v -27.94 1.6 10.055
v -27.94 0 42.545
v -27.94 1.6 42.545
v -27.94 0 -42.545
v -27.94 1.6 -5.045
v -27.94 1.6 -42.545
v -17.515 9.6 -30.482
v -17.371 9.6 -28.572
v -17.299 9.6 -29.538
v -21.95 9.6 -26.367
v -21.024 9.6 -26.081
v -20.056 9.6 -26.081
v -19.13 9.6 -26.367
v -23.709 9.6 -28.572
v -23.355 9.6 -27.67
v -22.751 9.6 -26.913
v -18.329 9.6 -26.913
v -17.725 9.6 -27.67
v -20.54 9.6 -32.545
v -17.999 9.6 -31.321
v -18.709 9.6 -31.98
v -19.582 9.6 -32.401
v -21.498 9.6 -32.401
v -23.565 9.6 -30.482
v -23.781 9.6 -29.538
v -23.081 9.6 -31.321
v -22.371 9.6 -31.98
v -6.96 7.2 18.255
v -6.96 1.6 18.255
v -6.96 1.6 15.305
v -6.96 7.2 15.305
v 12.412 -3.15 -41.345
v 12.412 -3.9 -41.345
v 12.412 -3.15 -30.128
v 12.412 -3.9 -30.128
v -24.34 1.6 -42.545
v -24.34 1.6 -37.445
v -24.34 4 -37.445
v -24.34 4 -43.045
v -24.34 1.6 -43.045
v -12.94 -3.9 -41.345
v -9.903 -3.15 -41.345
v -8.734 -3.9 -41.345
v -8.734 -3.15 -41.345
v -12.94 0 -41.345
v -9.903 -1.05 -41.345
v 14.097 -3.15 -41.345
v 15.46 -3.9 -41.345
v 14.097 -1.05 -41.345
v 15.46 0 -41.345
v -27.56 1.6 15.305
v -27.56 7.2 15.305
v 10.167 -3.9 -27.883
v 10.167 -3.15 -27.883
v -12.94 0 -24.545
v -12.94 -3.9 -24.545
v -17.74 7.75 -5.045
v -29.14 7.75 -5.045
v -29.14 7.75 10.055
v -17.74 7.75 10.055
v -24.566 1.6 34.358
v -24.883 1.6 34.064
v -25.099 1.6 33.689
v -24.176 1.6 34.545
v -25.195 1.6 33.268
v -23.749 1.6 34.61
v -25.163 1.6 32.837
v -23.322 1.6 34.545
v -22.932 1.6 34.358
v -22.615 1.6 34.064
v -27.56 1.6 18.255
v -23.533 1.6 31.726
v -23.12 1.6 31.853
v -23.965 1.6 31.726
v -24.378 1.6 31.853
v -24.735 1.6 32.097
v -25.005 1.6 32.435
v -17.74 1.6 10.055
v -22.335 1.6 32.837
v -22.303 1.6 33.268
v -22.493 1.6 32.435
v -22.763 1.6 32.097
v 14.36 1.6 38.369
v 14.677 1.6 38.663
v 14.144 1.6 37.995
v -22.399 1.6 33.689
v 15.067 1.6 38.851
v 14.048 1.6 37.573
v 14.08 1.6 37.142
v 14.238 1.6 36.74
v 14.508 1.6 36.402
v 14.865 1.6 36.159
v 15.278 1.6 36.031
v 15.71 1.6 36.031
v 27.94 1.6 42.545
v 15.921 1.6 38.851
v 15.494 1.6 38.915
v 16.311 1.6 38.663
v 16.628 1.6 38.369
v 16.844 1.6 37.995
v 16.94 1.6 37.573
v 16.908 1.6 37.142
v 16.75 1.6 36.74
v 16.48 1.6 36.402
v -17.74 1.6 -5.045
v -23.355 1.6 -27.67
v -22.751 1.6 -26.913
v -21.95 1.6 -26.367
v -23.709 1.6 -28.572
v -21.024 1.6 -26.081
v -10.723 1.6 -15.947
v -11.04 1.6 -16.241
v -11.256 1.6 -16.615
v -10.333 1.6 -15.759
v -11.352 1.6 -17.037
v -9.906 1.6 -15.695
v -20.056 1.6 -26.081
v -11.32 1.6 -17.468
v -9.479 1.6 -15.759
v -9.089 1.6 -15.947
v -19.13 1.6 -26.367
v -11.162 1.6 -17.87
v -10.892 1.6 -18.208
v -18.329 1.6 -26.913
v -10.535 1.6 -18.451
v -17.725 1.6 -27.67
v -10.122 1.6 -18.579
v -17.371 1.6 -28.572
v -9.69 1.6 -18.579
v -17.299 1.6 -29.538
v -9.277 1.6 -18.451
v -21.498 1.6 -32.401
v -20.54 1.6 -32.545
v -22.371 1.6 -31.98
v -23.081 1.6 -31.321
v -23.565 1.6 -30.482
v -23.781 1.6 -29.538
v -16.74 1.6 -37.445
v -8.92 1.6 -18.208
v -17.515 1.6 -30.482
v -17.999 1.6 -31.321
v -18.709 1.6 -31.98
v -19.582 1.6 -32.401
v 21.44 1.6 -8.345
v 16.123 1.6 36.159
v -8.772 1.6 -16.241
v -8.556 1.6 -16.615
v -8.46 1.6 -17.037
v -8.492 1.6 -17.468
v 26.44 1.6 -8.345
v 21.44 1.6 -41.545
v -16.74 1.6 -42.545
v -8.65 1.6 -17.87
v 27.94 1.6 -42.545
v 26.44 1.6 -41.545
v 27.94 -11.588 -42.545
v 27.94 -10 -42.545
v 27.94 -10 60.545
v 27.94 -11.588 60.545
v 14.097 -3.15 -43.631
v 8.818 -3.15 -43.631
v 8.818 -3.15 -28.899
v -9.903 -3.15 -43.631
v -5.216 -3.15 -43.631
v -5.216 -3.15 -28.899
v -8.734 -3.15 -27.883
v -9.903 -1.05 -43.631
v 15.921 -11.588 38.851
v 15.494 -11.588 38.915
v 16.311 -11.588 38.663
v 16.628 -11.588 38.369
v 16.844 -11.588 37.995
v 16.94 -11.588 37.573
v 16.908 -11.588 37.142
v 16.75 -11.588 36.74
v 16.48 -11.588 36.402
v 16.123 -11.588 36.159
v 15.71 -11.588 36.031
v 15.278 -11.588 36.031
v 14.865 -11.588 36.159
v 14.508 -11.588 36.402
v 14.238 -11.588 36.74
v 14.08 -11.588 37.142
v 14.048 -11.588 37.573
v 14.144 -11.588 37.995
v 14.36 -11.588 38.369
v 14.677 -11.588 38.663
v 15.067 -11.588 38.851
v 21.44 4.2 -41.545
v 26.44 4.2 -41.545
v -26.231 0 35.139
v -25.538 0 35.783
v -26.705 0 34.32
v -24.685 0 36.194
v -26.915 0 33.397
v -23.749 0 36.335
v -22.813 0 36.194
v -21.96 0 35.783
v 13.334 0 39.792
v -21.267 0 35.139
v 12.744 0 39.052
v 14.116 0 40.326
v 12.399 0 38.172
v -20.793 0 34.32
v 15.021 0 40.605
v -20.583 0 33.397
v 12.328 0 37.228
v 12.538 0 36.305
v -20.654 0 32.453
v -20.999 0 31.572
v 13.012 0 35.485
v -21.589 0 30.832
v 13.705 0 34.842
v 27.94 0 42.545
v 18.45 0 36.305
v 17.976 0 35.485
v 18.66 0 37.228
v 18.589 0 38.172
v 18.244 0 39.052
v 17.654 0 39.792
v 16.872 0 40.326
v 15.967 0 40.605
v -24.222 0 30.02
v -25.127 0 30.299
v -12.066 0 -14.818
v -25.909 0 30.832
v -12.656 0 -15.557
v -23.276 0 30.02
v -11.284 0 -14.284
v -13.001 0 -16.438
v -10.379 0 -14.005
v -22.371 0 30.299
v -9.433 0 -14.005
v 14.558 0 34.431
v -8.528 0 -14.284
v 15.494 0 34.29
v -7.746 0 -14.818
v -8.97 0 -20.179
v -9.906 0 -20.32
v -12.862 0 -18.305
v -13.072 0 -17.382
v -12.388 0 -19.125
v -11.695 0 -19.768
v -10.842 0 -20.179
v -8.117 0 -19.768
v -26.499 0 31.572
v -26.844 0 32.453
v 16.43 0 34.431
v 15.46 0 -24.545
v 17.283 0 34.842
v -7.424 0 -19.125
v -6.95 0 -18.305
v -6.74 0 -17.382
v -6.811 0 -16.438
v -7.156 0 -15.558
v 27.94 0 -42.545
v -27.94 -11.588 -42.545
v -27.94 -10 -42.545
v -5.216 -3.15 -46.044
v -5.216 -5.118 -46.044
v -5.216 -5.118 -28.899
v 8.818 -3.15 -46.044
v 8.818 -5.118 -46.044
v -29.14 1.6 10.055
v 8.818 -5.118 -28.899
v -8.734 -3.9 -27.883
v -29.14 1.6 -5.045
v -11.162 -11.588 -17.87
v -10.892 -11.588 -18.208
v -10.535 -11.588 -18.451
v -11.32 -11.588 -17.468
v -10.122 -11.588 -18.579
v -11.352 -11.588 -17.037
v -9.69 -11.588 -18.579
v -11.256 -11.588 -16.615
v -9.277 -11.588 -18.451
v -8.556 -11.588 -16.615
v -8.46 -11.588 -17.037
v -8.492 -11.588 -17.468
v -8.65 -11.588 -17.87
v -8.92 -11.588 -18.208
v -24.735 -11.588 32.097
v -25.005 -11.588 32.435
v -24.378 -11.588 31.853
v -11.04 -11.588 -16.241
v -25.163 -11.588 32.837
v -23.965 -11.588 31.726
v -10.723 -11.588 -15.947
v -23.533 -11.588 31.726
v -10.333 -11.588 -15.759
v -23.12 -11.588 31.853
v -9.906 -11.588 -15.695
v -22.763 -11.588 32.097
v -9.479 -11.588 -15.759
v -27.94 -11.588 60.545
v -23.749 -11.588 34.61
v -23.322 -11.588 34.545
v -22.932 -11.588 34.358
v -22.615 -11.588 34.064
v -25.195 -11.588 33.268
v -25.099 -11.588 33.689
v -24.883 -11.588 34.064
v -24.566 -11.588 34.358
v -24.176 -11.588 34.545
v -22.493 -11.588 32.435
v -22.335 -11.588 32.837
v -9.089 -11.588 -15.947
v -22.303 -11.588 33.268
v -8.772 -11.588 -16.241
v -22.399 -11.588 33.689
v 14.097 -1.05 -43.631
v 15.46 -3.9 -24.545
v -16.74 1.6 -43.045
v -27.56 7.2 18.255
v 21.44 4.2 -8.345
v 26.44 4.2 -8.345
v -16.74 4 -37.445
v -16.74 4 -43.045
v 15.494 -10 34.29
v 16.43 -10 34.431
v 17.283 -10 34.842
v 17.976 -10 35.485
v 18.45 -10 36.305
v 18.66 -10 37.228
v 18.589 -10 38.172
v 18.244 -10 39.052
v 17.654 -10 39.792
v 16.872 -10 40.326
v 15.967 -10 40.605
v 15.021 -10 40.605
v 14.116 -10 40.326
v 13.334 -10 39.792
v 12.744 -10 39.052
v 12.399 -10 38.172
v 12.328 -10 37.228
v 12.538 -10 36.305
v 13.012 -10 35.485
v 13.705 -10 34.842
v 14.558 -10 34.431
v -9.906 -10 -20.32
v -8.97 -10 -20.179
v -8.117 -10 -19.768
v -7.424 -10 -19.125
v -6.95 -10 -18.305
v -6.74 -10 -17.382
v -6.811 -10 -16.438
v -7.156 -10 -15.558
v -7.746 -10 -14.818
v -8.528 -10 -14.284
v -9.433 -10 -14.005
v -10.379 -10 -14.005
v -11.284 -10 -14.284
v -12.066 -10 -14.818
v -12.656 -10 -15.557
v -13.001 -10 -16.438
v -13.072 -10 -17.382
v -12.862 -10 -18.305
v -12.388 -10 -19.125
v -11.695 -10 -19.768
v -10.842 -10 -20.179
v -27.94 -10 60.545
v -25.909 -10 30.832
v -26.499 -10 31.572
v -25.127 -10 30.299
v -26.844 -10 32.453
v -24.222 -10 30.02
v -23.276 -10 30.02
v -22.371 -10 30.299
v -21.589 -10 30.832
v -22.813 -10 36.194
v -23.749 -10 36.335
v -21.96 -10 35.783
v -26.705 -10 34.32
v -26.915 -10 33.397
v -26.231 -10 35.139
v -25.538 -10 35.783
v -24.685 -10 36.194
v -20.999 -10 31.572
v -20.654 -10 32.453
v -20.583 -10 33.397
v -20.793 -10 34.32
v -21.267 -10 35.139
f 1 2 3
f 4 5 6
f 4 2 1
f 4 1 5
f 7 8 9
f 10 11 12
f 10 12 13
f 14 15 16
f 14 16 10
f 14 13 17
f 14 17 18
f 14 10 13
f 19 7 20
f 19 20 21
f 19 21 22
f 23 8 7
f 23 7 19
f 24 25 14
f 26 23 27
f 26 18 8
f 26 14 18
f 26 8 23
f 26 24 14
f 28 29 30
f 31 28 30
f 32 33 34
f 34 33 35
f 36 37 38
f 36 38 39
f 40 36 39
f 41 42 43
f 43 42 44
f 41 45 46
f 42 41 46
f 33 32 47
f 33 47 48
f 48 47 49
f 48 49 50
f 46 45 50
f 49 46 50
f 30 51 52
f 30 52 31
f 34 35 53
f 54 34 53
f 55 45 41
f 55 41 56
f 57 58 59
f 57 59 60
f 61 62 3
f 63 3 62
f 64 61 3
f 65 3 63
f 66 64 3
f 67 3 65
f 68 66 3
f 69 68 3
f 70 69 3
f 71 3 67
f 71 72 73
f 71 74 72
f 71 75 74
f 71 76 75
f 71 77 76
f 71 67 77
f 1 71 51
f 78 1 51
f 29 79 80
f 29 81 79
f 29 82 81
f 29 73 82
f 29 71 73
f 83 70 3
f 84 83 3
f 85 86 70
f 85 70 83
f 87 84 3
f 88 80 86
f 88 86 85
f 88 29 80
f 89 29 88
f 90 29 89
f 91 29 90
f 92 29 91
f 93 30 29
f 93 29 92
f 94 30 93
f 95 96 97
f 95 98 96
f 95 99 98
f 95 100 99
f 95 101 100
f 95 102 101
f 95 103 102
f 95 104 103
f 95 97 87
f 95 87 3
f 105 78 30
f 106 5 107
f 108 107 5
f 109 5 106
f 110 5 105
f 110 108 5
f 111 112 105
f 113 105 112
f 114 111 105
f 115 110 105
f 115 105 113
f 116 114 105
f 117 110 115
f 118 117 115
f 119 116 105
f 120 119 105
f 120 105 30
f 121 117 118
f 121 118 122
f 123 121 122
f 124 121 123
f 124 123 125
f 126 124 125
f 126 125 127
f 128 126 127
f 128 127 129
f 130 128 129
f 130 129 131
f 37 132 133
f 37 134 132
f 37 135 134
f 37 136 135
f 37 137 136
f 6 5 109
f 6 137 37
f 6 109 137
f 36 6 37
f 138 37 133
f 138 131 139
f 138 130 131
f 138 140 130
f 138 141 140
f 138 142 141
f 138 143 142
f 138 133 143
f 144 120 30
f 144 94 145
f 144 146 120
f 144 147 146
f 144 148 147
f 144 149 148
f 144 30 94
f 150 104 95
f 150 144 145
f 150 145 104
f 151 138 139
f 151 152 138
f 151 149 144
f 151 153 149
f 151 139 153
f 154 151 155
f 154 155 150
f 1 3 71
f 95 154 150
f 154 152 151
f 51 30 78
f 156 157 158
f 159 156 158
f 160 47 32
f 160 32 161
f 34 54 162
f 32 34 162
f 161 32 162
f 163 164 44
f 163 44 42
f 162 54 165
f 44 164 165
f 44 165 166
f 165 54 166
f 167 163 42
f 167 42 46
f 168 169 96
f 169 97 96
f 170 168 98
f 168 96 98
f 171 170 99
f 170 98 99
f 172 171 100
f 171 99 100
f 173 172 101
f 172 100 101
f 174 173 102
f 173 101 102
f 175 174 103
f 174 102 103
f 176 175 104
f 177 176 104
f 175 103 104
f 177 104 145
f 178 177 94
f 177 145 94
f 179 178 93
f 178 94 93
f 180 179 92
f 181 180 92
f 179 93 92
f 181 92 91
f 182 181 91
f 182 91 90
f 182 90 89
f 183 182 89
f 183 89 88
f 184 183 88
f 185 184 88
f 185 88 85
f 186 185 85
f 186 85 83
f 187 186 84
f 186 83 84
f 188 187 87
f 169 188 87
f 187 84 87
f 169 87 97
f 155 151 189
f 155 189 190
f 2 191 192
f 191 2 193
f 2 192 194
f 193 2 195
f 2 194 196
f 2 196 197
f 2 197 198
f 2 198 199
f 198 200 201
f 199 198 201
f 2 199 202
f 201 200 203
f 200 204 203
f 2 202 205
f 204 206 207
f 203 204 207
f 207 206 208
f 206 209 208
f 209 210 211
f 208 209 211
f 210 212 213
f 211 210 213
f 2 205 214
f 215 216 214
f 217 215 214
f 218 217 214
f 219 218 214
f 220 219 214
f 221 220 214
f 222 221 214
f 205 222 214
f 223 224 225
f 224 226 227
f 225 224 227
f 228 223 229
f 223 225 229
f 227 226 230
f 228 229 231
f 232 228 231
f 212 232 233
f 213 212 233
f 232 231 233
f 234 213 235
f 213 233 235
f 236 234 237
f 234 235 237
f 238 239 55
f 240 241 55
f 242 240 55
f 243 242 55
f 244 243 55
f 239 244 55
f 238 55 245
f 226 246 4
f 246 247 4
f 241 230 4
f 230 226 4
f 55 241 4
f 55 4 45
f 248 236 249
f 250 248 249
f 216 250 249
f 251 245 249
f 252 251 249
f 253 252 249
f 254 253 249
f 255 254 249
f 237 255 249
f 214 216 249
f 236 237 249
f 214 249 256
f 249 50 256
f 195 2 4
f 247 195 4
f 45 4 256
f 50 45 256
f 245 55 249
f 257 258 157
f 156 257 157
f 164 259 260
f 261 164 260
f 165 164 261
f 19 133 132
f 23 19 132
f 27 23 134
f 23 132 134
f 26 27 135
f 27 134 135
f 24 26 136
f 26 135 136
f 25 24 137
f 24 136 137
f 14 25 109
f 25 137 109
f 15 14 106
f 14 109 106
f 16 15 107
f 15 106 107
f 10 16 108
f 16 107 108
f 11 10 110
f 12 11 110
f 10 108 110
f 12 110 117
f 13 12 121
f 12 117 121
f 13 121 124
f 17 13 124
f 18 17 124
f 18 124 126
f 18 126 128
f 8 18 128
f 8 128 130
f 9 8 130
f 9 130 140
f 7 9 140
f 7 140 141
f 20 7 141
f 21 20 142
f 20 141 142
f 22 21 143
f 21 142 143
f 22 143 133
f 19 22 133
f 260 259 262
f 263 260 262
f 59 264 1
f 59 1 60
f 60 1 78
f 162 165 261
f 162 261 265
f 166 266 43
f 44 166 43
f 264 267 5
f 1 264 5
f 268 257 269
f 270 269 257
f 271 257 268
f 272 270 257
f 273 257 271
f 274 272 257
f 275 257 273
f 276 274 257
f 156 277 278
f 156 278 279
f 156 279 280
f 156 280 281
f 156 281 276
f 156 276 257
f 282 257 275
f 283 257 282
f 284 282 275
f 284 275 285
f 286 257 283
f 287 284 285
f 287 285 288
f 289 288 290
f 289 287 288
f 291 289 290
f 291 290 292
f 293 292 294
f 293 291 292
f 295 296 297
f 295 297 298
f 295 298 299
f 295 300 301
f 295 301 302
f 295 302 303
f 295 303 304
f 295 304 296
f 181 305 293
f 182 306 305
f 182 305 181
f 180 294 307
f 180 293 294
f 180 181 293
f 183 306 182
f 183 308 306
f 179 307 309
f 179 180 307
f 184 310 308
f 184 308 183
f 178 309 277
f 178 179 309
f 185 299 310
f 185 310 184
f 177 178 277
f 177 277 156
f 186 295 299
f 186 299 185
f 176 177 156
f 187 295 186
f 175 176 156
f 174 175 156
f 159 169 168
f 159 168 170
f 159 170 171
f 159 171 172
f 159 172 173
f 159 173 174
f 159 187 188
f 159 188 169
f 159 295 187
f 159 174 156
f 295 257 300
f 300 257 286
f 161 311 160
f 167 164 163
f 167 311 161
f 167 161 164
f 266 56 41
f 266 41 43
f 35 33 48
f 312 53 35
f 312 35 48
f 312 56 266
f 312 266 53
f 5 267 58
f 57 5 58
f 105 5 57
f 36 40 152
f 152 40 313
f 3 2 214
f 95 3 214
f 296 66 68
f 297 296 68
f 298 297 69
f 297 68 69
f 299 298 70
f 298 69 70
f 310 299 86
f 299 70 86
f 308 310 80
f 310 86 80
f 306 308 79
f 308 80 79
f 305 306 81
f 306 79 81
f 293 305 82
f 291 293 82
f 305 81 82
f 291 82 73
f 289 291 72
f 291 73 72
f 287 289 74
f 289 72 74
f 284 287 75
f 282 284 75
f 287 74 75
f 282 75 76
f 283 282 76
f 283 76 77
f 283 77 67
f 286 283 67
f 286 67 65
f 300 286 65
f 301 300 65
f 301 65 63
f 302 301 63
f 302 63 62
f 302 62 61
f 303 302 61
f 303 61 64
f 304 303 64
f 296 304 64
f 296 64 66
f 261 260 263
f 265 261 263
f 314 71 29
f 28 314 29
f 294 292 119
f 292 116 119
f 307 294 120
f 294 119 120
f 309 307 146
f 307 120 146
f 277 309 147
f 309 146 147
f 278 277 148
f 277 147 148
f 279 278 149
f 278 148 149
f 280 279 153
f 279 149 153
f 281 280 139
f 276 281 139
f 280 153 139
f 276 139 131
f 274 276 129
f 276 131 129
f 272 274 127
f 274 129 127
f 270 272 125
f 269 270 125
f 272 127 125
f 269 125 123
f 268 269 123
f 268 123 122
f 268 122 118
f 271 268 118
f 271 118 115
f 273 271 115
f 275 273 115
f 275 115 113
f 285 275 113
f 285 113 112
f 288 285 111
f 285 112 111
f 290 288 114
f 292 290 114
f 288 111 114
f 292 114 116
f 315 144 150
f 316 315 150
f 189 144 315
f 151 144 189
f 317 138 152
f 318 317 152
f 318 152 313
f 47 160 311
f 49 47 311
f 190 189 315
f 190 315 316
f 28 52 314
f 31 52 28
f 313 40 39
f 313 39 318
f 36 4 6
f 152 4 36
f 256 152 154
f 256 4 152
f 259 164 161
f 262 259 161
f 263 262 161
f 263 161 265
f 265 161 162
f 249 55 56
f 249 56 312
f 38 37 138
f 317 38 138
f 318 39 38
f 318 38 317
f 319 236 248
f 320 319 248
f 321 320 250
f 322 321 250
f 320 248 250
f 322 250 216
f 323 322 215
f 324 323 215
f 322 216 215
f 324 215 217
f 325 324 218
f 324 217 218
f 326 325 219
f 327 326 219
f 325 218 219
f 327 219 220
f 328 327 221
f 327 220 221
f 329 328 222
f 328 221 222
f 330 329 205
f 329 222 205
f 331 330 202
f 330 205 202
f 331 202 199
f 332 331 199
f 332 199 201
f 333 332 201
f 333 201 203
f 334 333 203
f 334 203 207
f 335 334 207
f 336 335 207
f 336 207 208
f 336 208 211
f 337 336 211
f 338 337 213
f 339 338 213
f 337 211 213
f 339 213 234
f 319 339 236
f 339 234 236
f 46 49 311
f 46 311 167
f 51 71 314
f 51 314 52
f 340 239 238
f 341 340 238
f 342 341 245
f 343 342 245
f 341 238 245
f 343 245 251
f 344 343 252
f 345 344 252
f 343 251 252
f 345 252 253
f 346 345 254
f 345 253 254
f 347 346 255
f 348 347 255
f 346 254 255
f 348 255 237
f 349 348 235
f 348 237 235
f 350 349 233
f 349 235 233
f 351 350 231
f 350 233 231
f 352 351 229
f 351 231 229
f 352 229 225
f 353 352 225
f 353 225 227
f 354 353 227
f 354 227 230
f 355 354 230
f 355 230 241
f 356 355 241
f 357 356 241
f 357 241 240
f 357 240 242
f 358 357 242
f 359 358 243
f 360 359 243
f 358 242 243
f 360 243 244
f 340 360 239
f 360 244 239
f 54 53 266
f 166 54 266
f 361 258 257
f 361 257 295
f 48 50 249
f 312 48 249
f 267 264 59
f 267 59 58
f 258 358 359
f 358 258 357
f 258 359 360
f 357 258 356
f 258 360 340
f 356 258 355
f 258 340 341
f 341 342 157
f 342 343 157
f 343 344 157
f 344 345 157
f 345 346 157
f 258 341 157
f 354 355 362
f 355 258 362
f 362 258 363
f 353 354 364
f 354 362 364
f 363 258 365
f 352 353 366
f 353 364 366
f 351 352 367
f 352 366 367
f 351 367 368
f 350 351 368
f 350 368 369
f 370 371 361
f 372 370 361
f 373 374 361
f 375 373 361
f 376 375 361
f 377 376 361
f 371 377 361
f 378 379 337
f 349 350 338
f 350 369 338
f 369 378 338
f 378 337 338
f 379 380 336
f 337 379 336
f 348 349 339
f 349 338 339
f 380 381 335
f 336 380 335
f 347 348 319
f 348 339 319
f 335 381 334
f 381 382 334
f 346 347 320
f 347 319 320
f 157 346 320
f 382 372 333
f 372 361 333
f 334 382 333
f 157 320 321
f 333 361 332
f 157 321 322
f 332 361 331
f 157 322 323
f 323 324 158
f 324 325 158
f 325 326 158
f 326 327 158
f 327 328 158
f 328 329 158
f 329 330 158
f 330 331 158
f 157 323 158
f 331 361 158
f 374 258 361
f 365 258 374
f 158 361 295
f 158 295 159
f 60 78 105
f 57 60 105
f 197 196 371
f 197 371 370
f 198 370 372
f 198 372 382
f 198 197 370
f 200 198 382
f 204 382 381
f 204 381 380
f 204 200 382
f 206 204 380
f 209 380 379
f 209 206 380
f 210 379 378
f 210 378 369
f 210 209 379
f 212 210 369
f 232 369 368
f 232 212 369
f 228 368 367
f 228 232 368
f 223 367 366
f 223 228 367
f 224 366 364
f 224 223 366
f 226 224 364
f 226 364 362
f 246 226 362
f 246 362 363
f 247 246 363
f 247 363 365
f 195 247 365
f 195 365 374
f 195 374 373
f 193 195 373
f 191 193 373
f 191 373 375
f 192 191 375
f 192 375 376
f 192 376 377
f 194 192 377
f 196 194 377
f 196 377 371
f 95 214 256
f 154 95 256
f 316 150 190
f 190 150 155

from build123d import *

# Parameters (mm, degrees)
SKETCH2_W               = 55.88
SKETCH2_H               = 85.09
FIBERGLASS_PCB_DEPTH    = 1.6
SKETCH3_W               = 7.6
SKETCH3_H               = 5.6
USB_MICRO_B_POWER_DEPTH = 2.4
SKETCH4_W               = 5
SKETCH4_H               = 33.2
BOSS_EXTRUDE3_DEPTH     = 2.6
SKETCH5_W               = 11.4
SKETCH5_H               = 15.1
BOSS_EXTRUDE4_DEPTH     = 6.15
SKETCH6_W               = 20.6
SKETCH6_H               = 2.95
BOSS_EXTRUDE5_DEPTH     = 5.6
SKETCH8_R               = 3.25
BOSS_EXTRUDE6_DEPTH     = 8
SKETCH9_W               = 28.4
SKETCH9_H               = 16.8
BOSS_EXTRUDE7_DEPTH     = 3.9
SKETCH10_W              = 24
SKETCH10_H              = 2.1
BOSS_EXTRUDE8_DEPTH     = 2.286
SKETCH11_R              = 1.45
CUT_EXTRUDE1_DEPTH      = 54.073569326
SKETCH12_R              = 3.175
BOSS_EXTRUDE9_DEPTH     = 10
SKETCH13_W              = 55.88
SKETCH13_H              = 103.09
BOSS_EXTRUDE10_DEPTH    = 1.5875
SKETCH14_R              = 1.45
CUT_EXTRUDE2_DEPTH      = 69.474424286
CUT_EXTRUDE3_DEPTH      = 0.75
SKETCH16_W              = 14.0335
SKETCH16_H              = 17.145
BOSS_EXTRUDE11_DEPTH    = 1.9685
BOSS_EXTRUDE13_REACH    = 70.474
SKETCH18_R              = 3.175
SKETCH19_R              = 1.45
CUT_EXTRUDE5_DEPTH      = 69.474424286


with BuildPart() as part:
    # Sketch2 → Fiberglass PCB (new body)
    with BuildSketch(Plane(origin=(0, 0, 0), x_dir=(1, 0, 0), z_dir=(0, 1, 0))):
        Rectangle(SKETCH2_W, SKETCH2_H)
    extrude(amount=FIBERGLASS_PCB_DEPTH)

    # Sketch3 → USB Micro-B Power (add)
    with BuildSketch(Plane(origin=(0, 1.6, 0), x_dir=(1, 0, 0), z_dir=(0, 1, 0))):
        with Locations((-20.54, 40.245)):
            Rectangle(SKETCH3_W, SKETCH3_H)
    extrude(amount=USB_MICRO_B_POWER_DEPTH)

    # Sketch4 → Boss-Extrude3 (add)
    with BuildSketch(Plane(origin=(0, 1.6, 0), x_dir=(1, 0, 0), z_dir=(0, 1, 0))):
        with Locations((23.94, 24.945)):
            Rectangle(SKETCH4_W, SKETCH4_H)
    extrude(amount=BOSS_EXTRUDE3_DEPTH)

    # Sketch5 → Boss-Extrude4 (add)
    with BuildSketch(Plane(origin=(0, 1.6, 0), x_dir=(1, 0, 0), z_dir=(0, 1, 0))):
        with Locations((-23.44, -2.505)):
            Rectangle(SKETCH5_W, SKETCH5_H)
    extrude(amount=BOSS_EXTRUDE4_DEPTH)

    # Sketch6 → Boss-Extrude5 (add)
    with BuildSketch(Plane(origin=(0, 1.6, 0), x_dir=(1, 0, 0), z_dir=(0, 1, 0))):
        with Locations((-17.26, -16.78)):
            Rectangle(SKETCH6_W, SKETCH6_H)
    extrude(amount=BOSS_EXTRUDE5_DEPTH)

    # Sketch8 → Boss-Extrude6 (add)
    with BuildSketch(Plane(origin=(0, 1.6, 0), x_dir=(1, 0, 0), z_dir=(0, 1, 0))):
        with Locations(Location((-20.54, 29.295, 0), (0, 0, 90))):
            Circle(SKETCH8_R)
    extrude(amount=BOSS_EXTRUDE6_DEPTH)

    # Sketch9 → Boss-Extrude7 (add)
    with BuildSketch(Plane.XZ):
        with Locations((1.26, -32.945)):
            Rectangle(SKETCH9_W, SKETCH9_H)
    extrude(amount=BOSS_EXTRUDE7_DEPTH)

    # Sketch10 → Boss-Extrude8 (add)
    with BuildSketch(Plane(origin=(0, 0, -41.345), x_dir=(-1, 0, 0), z_dir=(0, 0, -1))):
        with Locations((-2.097, -2.1)):
            Rectangle(SKETCH10_W, SKETCH10_H)
    extrude(amount=BOSS_EXTRUDE8_DEPTH)

    # Sketch11 → Cut-Extrude1 (cut, through all)
    with BuildSketch(Plane(origin=(0, 1.6, 0), x_dir=(1, 0, 0), z_dir=(0, 1, 0))):
        with Locations(Location((15.494, -37.465, 0), (0, 0, 270))):
            Circle(SKETCH11_R)
        with Locations(Location((-9.906, 17.145, 0), (0, 0, 270))):
            Circle(SKETCH11_R)
    extrude(amount=-CUT_EXTRUDE1_DEPTH, mode=Mode.SUBTRACT)

    # Sketch12 → Boss-Extrude9 (add)
    with BuildSketch(Plane.XZ):
        with Locations(Location((-9.906, -17.145, 0), (0, 0, 270))):
            Circle(SKETCH12_R)
        with Locations(Location((15.494, 37.465, 0), (0, 0, 270))):
            Circle(SKETCH12_R)
    extrude(amount=BOSS_EXTRUDE9_DEPTH)

    # Sketch13 → Boss-Extrude10 (add)
    with BuildSketch(Plane.XZ.offset(10)):
        with Locations((0, 9)):
            Rectangle(SKETCH13_W, SKETCH13_H)
    extrude(amount=BOSS_EXTRUDE10_DEPTH)

    # Sketch14 → Cut-Extrude2 (cut, through all)
    with BuildSketch(Plane(origin=(0, 1.6, 0), x_dir=(1, 0, 0), z_dir=(0, 1, 0))):
        with Locations(Location((-9.906, 17.145, 0), (0, 0, 270))):
            Circle(SKETCH14_R)
        with Locations(Location((15.494, -37.465, 0), (0, 0, 270))):
            Circle(SKETCH14_R)
    extrude(amount=-CUT_EXTRUDE2_DEPTH, mode=Mode.SUBTRACT)

    # Sketch15 → Cut-Extrude3 (cut)
    with BuildSketch(Plane(origin=(0, -3.9, 0), x_dir=(-1, 0, 0), z_dir=(0, -1, 0))):
        Polygon((8.7335, 41.345), (-12.412, 41.345), (-12.412, 30.12806403), (-10.16693597, 27.883), (8.7335, 27.883), align=None)
    extrude(amount=-CUT_EXTRUDE3_DEPTH, mode=Mode.SUBTRACT)

    # Sketch16 → Boss-Extrude11 (add)
    with BuildSketch(Plane.XZ.offset(3.15)):
        with Locations((1.80115, -37.4715)):
            Rectangle(SKETCH16_W, SKETCH16_H)
    extrude(amount=BOSS_EXTRUDE11_DEPTH)

    # Sketch18 → Boss-Extrude13 (add, up to next)
    with BuildSketch(Plane(origin=(0, 1.6, 0), x_dir=(1, 0, 0), z_dir=(0, 1, 0)), mode=Mode.PRIVATE) as boss_extrude13_sk1:
        with Locations(Location((-23.749, -33.1597, 0), (0, 0, 270))):
            Circle(SKETCH18_R)
    boss_extrude13_tool1 = extrude(boss_extrude13_sk1.sketch, amount=-BOSS_EXTRUDE13_REACH, mode=Mode.PRIVATE) - part.part
    add(boss_extrude13_tool1.solids().sort_by_distance((-23.749, 1.6, 33.1597))[0])

    # Sketch19 → Cut-Extrude5 (cut, through all)
    with BuildSketch(Plane(origin=(0, 1.6, 0), x_dir=(1, 0, 0), z_dir=(0, 1, 0))):
        with Locations(Location((-23.749, -33.1597, 0), (0, 0, 270))):
            Circle(SKETCH19_R)
    extrude(amount=-CUT_EXTRUDE5_DEPTH, mode=Mode.SUBTRACT)


solid = part.part
